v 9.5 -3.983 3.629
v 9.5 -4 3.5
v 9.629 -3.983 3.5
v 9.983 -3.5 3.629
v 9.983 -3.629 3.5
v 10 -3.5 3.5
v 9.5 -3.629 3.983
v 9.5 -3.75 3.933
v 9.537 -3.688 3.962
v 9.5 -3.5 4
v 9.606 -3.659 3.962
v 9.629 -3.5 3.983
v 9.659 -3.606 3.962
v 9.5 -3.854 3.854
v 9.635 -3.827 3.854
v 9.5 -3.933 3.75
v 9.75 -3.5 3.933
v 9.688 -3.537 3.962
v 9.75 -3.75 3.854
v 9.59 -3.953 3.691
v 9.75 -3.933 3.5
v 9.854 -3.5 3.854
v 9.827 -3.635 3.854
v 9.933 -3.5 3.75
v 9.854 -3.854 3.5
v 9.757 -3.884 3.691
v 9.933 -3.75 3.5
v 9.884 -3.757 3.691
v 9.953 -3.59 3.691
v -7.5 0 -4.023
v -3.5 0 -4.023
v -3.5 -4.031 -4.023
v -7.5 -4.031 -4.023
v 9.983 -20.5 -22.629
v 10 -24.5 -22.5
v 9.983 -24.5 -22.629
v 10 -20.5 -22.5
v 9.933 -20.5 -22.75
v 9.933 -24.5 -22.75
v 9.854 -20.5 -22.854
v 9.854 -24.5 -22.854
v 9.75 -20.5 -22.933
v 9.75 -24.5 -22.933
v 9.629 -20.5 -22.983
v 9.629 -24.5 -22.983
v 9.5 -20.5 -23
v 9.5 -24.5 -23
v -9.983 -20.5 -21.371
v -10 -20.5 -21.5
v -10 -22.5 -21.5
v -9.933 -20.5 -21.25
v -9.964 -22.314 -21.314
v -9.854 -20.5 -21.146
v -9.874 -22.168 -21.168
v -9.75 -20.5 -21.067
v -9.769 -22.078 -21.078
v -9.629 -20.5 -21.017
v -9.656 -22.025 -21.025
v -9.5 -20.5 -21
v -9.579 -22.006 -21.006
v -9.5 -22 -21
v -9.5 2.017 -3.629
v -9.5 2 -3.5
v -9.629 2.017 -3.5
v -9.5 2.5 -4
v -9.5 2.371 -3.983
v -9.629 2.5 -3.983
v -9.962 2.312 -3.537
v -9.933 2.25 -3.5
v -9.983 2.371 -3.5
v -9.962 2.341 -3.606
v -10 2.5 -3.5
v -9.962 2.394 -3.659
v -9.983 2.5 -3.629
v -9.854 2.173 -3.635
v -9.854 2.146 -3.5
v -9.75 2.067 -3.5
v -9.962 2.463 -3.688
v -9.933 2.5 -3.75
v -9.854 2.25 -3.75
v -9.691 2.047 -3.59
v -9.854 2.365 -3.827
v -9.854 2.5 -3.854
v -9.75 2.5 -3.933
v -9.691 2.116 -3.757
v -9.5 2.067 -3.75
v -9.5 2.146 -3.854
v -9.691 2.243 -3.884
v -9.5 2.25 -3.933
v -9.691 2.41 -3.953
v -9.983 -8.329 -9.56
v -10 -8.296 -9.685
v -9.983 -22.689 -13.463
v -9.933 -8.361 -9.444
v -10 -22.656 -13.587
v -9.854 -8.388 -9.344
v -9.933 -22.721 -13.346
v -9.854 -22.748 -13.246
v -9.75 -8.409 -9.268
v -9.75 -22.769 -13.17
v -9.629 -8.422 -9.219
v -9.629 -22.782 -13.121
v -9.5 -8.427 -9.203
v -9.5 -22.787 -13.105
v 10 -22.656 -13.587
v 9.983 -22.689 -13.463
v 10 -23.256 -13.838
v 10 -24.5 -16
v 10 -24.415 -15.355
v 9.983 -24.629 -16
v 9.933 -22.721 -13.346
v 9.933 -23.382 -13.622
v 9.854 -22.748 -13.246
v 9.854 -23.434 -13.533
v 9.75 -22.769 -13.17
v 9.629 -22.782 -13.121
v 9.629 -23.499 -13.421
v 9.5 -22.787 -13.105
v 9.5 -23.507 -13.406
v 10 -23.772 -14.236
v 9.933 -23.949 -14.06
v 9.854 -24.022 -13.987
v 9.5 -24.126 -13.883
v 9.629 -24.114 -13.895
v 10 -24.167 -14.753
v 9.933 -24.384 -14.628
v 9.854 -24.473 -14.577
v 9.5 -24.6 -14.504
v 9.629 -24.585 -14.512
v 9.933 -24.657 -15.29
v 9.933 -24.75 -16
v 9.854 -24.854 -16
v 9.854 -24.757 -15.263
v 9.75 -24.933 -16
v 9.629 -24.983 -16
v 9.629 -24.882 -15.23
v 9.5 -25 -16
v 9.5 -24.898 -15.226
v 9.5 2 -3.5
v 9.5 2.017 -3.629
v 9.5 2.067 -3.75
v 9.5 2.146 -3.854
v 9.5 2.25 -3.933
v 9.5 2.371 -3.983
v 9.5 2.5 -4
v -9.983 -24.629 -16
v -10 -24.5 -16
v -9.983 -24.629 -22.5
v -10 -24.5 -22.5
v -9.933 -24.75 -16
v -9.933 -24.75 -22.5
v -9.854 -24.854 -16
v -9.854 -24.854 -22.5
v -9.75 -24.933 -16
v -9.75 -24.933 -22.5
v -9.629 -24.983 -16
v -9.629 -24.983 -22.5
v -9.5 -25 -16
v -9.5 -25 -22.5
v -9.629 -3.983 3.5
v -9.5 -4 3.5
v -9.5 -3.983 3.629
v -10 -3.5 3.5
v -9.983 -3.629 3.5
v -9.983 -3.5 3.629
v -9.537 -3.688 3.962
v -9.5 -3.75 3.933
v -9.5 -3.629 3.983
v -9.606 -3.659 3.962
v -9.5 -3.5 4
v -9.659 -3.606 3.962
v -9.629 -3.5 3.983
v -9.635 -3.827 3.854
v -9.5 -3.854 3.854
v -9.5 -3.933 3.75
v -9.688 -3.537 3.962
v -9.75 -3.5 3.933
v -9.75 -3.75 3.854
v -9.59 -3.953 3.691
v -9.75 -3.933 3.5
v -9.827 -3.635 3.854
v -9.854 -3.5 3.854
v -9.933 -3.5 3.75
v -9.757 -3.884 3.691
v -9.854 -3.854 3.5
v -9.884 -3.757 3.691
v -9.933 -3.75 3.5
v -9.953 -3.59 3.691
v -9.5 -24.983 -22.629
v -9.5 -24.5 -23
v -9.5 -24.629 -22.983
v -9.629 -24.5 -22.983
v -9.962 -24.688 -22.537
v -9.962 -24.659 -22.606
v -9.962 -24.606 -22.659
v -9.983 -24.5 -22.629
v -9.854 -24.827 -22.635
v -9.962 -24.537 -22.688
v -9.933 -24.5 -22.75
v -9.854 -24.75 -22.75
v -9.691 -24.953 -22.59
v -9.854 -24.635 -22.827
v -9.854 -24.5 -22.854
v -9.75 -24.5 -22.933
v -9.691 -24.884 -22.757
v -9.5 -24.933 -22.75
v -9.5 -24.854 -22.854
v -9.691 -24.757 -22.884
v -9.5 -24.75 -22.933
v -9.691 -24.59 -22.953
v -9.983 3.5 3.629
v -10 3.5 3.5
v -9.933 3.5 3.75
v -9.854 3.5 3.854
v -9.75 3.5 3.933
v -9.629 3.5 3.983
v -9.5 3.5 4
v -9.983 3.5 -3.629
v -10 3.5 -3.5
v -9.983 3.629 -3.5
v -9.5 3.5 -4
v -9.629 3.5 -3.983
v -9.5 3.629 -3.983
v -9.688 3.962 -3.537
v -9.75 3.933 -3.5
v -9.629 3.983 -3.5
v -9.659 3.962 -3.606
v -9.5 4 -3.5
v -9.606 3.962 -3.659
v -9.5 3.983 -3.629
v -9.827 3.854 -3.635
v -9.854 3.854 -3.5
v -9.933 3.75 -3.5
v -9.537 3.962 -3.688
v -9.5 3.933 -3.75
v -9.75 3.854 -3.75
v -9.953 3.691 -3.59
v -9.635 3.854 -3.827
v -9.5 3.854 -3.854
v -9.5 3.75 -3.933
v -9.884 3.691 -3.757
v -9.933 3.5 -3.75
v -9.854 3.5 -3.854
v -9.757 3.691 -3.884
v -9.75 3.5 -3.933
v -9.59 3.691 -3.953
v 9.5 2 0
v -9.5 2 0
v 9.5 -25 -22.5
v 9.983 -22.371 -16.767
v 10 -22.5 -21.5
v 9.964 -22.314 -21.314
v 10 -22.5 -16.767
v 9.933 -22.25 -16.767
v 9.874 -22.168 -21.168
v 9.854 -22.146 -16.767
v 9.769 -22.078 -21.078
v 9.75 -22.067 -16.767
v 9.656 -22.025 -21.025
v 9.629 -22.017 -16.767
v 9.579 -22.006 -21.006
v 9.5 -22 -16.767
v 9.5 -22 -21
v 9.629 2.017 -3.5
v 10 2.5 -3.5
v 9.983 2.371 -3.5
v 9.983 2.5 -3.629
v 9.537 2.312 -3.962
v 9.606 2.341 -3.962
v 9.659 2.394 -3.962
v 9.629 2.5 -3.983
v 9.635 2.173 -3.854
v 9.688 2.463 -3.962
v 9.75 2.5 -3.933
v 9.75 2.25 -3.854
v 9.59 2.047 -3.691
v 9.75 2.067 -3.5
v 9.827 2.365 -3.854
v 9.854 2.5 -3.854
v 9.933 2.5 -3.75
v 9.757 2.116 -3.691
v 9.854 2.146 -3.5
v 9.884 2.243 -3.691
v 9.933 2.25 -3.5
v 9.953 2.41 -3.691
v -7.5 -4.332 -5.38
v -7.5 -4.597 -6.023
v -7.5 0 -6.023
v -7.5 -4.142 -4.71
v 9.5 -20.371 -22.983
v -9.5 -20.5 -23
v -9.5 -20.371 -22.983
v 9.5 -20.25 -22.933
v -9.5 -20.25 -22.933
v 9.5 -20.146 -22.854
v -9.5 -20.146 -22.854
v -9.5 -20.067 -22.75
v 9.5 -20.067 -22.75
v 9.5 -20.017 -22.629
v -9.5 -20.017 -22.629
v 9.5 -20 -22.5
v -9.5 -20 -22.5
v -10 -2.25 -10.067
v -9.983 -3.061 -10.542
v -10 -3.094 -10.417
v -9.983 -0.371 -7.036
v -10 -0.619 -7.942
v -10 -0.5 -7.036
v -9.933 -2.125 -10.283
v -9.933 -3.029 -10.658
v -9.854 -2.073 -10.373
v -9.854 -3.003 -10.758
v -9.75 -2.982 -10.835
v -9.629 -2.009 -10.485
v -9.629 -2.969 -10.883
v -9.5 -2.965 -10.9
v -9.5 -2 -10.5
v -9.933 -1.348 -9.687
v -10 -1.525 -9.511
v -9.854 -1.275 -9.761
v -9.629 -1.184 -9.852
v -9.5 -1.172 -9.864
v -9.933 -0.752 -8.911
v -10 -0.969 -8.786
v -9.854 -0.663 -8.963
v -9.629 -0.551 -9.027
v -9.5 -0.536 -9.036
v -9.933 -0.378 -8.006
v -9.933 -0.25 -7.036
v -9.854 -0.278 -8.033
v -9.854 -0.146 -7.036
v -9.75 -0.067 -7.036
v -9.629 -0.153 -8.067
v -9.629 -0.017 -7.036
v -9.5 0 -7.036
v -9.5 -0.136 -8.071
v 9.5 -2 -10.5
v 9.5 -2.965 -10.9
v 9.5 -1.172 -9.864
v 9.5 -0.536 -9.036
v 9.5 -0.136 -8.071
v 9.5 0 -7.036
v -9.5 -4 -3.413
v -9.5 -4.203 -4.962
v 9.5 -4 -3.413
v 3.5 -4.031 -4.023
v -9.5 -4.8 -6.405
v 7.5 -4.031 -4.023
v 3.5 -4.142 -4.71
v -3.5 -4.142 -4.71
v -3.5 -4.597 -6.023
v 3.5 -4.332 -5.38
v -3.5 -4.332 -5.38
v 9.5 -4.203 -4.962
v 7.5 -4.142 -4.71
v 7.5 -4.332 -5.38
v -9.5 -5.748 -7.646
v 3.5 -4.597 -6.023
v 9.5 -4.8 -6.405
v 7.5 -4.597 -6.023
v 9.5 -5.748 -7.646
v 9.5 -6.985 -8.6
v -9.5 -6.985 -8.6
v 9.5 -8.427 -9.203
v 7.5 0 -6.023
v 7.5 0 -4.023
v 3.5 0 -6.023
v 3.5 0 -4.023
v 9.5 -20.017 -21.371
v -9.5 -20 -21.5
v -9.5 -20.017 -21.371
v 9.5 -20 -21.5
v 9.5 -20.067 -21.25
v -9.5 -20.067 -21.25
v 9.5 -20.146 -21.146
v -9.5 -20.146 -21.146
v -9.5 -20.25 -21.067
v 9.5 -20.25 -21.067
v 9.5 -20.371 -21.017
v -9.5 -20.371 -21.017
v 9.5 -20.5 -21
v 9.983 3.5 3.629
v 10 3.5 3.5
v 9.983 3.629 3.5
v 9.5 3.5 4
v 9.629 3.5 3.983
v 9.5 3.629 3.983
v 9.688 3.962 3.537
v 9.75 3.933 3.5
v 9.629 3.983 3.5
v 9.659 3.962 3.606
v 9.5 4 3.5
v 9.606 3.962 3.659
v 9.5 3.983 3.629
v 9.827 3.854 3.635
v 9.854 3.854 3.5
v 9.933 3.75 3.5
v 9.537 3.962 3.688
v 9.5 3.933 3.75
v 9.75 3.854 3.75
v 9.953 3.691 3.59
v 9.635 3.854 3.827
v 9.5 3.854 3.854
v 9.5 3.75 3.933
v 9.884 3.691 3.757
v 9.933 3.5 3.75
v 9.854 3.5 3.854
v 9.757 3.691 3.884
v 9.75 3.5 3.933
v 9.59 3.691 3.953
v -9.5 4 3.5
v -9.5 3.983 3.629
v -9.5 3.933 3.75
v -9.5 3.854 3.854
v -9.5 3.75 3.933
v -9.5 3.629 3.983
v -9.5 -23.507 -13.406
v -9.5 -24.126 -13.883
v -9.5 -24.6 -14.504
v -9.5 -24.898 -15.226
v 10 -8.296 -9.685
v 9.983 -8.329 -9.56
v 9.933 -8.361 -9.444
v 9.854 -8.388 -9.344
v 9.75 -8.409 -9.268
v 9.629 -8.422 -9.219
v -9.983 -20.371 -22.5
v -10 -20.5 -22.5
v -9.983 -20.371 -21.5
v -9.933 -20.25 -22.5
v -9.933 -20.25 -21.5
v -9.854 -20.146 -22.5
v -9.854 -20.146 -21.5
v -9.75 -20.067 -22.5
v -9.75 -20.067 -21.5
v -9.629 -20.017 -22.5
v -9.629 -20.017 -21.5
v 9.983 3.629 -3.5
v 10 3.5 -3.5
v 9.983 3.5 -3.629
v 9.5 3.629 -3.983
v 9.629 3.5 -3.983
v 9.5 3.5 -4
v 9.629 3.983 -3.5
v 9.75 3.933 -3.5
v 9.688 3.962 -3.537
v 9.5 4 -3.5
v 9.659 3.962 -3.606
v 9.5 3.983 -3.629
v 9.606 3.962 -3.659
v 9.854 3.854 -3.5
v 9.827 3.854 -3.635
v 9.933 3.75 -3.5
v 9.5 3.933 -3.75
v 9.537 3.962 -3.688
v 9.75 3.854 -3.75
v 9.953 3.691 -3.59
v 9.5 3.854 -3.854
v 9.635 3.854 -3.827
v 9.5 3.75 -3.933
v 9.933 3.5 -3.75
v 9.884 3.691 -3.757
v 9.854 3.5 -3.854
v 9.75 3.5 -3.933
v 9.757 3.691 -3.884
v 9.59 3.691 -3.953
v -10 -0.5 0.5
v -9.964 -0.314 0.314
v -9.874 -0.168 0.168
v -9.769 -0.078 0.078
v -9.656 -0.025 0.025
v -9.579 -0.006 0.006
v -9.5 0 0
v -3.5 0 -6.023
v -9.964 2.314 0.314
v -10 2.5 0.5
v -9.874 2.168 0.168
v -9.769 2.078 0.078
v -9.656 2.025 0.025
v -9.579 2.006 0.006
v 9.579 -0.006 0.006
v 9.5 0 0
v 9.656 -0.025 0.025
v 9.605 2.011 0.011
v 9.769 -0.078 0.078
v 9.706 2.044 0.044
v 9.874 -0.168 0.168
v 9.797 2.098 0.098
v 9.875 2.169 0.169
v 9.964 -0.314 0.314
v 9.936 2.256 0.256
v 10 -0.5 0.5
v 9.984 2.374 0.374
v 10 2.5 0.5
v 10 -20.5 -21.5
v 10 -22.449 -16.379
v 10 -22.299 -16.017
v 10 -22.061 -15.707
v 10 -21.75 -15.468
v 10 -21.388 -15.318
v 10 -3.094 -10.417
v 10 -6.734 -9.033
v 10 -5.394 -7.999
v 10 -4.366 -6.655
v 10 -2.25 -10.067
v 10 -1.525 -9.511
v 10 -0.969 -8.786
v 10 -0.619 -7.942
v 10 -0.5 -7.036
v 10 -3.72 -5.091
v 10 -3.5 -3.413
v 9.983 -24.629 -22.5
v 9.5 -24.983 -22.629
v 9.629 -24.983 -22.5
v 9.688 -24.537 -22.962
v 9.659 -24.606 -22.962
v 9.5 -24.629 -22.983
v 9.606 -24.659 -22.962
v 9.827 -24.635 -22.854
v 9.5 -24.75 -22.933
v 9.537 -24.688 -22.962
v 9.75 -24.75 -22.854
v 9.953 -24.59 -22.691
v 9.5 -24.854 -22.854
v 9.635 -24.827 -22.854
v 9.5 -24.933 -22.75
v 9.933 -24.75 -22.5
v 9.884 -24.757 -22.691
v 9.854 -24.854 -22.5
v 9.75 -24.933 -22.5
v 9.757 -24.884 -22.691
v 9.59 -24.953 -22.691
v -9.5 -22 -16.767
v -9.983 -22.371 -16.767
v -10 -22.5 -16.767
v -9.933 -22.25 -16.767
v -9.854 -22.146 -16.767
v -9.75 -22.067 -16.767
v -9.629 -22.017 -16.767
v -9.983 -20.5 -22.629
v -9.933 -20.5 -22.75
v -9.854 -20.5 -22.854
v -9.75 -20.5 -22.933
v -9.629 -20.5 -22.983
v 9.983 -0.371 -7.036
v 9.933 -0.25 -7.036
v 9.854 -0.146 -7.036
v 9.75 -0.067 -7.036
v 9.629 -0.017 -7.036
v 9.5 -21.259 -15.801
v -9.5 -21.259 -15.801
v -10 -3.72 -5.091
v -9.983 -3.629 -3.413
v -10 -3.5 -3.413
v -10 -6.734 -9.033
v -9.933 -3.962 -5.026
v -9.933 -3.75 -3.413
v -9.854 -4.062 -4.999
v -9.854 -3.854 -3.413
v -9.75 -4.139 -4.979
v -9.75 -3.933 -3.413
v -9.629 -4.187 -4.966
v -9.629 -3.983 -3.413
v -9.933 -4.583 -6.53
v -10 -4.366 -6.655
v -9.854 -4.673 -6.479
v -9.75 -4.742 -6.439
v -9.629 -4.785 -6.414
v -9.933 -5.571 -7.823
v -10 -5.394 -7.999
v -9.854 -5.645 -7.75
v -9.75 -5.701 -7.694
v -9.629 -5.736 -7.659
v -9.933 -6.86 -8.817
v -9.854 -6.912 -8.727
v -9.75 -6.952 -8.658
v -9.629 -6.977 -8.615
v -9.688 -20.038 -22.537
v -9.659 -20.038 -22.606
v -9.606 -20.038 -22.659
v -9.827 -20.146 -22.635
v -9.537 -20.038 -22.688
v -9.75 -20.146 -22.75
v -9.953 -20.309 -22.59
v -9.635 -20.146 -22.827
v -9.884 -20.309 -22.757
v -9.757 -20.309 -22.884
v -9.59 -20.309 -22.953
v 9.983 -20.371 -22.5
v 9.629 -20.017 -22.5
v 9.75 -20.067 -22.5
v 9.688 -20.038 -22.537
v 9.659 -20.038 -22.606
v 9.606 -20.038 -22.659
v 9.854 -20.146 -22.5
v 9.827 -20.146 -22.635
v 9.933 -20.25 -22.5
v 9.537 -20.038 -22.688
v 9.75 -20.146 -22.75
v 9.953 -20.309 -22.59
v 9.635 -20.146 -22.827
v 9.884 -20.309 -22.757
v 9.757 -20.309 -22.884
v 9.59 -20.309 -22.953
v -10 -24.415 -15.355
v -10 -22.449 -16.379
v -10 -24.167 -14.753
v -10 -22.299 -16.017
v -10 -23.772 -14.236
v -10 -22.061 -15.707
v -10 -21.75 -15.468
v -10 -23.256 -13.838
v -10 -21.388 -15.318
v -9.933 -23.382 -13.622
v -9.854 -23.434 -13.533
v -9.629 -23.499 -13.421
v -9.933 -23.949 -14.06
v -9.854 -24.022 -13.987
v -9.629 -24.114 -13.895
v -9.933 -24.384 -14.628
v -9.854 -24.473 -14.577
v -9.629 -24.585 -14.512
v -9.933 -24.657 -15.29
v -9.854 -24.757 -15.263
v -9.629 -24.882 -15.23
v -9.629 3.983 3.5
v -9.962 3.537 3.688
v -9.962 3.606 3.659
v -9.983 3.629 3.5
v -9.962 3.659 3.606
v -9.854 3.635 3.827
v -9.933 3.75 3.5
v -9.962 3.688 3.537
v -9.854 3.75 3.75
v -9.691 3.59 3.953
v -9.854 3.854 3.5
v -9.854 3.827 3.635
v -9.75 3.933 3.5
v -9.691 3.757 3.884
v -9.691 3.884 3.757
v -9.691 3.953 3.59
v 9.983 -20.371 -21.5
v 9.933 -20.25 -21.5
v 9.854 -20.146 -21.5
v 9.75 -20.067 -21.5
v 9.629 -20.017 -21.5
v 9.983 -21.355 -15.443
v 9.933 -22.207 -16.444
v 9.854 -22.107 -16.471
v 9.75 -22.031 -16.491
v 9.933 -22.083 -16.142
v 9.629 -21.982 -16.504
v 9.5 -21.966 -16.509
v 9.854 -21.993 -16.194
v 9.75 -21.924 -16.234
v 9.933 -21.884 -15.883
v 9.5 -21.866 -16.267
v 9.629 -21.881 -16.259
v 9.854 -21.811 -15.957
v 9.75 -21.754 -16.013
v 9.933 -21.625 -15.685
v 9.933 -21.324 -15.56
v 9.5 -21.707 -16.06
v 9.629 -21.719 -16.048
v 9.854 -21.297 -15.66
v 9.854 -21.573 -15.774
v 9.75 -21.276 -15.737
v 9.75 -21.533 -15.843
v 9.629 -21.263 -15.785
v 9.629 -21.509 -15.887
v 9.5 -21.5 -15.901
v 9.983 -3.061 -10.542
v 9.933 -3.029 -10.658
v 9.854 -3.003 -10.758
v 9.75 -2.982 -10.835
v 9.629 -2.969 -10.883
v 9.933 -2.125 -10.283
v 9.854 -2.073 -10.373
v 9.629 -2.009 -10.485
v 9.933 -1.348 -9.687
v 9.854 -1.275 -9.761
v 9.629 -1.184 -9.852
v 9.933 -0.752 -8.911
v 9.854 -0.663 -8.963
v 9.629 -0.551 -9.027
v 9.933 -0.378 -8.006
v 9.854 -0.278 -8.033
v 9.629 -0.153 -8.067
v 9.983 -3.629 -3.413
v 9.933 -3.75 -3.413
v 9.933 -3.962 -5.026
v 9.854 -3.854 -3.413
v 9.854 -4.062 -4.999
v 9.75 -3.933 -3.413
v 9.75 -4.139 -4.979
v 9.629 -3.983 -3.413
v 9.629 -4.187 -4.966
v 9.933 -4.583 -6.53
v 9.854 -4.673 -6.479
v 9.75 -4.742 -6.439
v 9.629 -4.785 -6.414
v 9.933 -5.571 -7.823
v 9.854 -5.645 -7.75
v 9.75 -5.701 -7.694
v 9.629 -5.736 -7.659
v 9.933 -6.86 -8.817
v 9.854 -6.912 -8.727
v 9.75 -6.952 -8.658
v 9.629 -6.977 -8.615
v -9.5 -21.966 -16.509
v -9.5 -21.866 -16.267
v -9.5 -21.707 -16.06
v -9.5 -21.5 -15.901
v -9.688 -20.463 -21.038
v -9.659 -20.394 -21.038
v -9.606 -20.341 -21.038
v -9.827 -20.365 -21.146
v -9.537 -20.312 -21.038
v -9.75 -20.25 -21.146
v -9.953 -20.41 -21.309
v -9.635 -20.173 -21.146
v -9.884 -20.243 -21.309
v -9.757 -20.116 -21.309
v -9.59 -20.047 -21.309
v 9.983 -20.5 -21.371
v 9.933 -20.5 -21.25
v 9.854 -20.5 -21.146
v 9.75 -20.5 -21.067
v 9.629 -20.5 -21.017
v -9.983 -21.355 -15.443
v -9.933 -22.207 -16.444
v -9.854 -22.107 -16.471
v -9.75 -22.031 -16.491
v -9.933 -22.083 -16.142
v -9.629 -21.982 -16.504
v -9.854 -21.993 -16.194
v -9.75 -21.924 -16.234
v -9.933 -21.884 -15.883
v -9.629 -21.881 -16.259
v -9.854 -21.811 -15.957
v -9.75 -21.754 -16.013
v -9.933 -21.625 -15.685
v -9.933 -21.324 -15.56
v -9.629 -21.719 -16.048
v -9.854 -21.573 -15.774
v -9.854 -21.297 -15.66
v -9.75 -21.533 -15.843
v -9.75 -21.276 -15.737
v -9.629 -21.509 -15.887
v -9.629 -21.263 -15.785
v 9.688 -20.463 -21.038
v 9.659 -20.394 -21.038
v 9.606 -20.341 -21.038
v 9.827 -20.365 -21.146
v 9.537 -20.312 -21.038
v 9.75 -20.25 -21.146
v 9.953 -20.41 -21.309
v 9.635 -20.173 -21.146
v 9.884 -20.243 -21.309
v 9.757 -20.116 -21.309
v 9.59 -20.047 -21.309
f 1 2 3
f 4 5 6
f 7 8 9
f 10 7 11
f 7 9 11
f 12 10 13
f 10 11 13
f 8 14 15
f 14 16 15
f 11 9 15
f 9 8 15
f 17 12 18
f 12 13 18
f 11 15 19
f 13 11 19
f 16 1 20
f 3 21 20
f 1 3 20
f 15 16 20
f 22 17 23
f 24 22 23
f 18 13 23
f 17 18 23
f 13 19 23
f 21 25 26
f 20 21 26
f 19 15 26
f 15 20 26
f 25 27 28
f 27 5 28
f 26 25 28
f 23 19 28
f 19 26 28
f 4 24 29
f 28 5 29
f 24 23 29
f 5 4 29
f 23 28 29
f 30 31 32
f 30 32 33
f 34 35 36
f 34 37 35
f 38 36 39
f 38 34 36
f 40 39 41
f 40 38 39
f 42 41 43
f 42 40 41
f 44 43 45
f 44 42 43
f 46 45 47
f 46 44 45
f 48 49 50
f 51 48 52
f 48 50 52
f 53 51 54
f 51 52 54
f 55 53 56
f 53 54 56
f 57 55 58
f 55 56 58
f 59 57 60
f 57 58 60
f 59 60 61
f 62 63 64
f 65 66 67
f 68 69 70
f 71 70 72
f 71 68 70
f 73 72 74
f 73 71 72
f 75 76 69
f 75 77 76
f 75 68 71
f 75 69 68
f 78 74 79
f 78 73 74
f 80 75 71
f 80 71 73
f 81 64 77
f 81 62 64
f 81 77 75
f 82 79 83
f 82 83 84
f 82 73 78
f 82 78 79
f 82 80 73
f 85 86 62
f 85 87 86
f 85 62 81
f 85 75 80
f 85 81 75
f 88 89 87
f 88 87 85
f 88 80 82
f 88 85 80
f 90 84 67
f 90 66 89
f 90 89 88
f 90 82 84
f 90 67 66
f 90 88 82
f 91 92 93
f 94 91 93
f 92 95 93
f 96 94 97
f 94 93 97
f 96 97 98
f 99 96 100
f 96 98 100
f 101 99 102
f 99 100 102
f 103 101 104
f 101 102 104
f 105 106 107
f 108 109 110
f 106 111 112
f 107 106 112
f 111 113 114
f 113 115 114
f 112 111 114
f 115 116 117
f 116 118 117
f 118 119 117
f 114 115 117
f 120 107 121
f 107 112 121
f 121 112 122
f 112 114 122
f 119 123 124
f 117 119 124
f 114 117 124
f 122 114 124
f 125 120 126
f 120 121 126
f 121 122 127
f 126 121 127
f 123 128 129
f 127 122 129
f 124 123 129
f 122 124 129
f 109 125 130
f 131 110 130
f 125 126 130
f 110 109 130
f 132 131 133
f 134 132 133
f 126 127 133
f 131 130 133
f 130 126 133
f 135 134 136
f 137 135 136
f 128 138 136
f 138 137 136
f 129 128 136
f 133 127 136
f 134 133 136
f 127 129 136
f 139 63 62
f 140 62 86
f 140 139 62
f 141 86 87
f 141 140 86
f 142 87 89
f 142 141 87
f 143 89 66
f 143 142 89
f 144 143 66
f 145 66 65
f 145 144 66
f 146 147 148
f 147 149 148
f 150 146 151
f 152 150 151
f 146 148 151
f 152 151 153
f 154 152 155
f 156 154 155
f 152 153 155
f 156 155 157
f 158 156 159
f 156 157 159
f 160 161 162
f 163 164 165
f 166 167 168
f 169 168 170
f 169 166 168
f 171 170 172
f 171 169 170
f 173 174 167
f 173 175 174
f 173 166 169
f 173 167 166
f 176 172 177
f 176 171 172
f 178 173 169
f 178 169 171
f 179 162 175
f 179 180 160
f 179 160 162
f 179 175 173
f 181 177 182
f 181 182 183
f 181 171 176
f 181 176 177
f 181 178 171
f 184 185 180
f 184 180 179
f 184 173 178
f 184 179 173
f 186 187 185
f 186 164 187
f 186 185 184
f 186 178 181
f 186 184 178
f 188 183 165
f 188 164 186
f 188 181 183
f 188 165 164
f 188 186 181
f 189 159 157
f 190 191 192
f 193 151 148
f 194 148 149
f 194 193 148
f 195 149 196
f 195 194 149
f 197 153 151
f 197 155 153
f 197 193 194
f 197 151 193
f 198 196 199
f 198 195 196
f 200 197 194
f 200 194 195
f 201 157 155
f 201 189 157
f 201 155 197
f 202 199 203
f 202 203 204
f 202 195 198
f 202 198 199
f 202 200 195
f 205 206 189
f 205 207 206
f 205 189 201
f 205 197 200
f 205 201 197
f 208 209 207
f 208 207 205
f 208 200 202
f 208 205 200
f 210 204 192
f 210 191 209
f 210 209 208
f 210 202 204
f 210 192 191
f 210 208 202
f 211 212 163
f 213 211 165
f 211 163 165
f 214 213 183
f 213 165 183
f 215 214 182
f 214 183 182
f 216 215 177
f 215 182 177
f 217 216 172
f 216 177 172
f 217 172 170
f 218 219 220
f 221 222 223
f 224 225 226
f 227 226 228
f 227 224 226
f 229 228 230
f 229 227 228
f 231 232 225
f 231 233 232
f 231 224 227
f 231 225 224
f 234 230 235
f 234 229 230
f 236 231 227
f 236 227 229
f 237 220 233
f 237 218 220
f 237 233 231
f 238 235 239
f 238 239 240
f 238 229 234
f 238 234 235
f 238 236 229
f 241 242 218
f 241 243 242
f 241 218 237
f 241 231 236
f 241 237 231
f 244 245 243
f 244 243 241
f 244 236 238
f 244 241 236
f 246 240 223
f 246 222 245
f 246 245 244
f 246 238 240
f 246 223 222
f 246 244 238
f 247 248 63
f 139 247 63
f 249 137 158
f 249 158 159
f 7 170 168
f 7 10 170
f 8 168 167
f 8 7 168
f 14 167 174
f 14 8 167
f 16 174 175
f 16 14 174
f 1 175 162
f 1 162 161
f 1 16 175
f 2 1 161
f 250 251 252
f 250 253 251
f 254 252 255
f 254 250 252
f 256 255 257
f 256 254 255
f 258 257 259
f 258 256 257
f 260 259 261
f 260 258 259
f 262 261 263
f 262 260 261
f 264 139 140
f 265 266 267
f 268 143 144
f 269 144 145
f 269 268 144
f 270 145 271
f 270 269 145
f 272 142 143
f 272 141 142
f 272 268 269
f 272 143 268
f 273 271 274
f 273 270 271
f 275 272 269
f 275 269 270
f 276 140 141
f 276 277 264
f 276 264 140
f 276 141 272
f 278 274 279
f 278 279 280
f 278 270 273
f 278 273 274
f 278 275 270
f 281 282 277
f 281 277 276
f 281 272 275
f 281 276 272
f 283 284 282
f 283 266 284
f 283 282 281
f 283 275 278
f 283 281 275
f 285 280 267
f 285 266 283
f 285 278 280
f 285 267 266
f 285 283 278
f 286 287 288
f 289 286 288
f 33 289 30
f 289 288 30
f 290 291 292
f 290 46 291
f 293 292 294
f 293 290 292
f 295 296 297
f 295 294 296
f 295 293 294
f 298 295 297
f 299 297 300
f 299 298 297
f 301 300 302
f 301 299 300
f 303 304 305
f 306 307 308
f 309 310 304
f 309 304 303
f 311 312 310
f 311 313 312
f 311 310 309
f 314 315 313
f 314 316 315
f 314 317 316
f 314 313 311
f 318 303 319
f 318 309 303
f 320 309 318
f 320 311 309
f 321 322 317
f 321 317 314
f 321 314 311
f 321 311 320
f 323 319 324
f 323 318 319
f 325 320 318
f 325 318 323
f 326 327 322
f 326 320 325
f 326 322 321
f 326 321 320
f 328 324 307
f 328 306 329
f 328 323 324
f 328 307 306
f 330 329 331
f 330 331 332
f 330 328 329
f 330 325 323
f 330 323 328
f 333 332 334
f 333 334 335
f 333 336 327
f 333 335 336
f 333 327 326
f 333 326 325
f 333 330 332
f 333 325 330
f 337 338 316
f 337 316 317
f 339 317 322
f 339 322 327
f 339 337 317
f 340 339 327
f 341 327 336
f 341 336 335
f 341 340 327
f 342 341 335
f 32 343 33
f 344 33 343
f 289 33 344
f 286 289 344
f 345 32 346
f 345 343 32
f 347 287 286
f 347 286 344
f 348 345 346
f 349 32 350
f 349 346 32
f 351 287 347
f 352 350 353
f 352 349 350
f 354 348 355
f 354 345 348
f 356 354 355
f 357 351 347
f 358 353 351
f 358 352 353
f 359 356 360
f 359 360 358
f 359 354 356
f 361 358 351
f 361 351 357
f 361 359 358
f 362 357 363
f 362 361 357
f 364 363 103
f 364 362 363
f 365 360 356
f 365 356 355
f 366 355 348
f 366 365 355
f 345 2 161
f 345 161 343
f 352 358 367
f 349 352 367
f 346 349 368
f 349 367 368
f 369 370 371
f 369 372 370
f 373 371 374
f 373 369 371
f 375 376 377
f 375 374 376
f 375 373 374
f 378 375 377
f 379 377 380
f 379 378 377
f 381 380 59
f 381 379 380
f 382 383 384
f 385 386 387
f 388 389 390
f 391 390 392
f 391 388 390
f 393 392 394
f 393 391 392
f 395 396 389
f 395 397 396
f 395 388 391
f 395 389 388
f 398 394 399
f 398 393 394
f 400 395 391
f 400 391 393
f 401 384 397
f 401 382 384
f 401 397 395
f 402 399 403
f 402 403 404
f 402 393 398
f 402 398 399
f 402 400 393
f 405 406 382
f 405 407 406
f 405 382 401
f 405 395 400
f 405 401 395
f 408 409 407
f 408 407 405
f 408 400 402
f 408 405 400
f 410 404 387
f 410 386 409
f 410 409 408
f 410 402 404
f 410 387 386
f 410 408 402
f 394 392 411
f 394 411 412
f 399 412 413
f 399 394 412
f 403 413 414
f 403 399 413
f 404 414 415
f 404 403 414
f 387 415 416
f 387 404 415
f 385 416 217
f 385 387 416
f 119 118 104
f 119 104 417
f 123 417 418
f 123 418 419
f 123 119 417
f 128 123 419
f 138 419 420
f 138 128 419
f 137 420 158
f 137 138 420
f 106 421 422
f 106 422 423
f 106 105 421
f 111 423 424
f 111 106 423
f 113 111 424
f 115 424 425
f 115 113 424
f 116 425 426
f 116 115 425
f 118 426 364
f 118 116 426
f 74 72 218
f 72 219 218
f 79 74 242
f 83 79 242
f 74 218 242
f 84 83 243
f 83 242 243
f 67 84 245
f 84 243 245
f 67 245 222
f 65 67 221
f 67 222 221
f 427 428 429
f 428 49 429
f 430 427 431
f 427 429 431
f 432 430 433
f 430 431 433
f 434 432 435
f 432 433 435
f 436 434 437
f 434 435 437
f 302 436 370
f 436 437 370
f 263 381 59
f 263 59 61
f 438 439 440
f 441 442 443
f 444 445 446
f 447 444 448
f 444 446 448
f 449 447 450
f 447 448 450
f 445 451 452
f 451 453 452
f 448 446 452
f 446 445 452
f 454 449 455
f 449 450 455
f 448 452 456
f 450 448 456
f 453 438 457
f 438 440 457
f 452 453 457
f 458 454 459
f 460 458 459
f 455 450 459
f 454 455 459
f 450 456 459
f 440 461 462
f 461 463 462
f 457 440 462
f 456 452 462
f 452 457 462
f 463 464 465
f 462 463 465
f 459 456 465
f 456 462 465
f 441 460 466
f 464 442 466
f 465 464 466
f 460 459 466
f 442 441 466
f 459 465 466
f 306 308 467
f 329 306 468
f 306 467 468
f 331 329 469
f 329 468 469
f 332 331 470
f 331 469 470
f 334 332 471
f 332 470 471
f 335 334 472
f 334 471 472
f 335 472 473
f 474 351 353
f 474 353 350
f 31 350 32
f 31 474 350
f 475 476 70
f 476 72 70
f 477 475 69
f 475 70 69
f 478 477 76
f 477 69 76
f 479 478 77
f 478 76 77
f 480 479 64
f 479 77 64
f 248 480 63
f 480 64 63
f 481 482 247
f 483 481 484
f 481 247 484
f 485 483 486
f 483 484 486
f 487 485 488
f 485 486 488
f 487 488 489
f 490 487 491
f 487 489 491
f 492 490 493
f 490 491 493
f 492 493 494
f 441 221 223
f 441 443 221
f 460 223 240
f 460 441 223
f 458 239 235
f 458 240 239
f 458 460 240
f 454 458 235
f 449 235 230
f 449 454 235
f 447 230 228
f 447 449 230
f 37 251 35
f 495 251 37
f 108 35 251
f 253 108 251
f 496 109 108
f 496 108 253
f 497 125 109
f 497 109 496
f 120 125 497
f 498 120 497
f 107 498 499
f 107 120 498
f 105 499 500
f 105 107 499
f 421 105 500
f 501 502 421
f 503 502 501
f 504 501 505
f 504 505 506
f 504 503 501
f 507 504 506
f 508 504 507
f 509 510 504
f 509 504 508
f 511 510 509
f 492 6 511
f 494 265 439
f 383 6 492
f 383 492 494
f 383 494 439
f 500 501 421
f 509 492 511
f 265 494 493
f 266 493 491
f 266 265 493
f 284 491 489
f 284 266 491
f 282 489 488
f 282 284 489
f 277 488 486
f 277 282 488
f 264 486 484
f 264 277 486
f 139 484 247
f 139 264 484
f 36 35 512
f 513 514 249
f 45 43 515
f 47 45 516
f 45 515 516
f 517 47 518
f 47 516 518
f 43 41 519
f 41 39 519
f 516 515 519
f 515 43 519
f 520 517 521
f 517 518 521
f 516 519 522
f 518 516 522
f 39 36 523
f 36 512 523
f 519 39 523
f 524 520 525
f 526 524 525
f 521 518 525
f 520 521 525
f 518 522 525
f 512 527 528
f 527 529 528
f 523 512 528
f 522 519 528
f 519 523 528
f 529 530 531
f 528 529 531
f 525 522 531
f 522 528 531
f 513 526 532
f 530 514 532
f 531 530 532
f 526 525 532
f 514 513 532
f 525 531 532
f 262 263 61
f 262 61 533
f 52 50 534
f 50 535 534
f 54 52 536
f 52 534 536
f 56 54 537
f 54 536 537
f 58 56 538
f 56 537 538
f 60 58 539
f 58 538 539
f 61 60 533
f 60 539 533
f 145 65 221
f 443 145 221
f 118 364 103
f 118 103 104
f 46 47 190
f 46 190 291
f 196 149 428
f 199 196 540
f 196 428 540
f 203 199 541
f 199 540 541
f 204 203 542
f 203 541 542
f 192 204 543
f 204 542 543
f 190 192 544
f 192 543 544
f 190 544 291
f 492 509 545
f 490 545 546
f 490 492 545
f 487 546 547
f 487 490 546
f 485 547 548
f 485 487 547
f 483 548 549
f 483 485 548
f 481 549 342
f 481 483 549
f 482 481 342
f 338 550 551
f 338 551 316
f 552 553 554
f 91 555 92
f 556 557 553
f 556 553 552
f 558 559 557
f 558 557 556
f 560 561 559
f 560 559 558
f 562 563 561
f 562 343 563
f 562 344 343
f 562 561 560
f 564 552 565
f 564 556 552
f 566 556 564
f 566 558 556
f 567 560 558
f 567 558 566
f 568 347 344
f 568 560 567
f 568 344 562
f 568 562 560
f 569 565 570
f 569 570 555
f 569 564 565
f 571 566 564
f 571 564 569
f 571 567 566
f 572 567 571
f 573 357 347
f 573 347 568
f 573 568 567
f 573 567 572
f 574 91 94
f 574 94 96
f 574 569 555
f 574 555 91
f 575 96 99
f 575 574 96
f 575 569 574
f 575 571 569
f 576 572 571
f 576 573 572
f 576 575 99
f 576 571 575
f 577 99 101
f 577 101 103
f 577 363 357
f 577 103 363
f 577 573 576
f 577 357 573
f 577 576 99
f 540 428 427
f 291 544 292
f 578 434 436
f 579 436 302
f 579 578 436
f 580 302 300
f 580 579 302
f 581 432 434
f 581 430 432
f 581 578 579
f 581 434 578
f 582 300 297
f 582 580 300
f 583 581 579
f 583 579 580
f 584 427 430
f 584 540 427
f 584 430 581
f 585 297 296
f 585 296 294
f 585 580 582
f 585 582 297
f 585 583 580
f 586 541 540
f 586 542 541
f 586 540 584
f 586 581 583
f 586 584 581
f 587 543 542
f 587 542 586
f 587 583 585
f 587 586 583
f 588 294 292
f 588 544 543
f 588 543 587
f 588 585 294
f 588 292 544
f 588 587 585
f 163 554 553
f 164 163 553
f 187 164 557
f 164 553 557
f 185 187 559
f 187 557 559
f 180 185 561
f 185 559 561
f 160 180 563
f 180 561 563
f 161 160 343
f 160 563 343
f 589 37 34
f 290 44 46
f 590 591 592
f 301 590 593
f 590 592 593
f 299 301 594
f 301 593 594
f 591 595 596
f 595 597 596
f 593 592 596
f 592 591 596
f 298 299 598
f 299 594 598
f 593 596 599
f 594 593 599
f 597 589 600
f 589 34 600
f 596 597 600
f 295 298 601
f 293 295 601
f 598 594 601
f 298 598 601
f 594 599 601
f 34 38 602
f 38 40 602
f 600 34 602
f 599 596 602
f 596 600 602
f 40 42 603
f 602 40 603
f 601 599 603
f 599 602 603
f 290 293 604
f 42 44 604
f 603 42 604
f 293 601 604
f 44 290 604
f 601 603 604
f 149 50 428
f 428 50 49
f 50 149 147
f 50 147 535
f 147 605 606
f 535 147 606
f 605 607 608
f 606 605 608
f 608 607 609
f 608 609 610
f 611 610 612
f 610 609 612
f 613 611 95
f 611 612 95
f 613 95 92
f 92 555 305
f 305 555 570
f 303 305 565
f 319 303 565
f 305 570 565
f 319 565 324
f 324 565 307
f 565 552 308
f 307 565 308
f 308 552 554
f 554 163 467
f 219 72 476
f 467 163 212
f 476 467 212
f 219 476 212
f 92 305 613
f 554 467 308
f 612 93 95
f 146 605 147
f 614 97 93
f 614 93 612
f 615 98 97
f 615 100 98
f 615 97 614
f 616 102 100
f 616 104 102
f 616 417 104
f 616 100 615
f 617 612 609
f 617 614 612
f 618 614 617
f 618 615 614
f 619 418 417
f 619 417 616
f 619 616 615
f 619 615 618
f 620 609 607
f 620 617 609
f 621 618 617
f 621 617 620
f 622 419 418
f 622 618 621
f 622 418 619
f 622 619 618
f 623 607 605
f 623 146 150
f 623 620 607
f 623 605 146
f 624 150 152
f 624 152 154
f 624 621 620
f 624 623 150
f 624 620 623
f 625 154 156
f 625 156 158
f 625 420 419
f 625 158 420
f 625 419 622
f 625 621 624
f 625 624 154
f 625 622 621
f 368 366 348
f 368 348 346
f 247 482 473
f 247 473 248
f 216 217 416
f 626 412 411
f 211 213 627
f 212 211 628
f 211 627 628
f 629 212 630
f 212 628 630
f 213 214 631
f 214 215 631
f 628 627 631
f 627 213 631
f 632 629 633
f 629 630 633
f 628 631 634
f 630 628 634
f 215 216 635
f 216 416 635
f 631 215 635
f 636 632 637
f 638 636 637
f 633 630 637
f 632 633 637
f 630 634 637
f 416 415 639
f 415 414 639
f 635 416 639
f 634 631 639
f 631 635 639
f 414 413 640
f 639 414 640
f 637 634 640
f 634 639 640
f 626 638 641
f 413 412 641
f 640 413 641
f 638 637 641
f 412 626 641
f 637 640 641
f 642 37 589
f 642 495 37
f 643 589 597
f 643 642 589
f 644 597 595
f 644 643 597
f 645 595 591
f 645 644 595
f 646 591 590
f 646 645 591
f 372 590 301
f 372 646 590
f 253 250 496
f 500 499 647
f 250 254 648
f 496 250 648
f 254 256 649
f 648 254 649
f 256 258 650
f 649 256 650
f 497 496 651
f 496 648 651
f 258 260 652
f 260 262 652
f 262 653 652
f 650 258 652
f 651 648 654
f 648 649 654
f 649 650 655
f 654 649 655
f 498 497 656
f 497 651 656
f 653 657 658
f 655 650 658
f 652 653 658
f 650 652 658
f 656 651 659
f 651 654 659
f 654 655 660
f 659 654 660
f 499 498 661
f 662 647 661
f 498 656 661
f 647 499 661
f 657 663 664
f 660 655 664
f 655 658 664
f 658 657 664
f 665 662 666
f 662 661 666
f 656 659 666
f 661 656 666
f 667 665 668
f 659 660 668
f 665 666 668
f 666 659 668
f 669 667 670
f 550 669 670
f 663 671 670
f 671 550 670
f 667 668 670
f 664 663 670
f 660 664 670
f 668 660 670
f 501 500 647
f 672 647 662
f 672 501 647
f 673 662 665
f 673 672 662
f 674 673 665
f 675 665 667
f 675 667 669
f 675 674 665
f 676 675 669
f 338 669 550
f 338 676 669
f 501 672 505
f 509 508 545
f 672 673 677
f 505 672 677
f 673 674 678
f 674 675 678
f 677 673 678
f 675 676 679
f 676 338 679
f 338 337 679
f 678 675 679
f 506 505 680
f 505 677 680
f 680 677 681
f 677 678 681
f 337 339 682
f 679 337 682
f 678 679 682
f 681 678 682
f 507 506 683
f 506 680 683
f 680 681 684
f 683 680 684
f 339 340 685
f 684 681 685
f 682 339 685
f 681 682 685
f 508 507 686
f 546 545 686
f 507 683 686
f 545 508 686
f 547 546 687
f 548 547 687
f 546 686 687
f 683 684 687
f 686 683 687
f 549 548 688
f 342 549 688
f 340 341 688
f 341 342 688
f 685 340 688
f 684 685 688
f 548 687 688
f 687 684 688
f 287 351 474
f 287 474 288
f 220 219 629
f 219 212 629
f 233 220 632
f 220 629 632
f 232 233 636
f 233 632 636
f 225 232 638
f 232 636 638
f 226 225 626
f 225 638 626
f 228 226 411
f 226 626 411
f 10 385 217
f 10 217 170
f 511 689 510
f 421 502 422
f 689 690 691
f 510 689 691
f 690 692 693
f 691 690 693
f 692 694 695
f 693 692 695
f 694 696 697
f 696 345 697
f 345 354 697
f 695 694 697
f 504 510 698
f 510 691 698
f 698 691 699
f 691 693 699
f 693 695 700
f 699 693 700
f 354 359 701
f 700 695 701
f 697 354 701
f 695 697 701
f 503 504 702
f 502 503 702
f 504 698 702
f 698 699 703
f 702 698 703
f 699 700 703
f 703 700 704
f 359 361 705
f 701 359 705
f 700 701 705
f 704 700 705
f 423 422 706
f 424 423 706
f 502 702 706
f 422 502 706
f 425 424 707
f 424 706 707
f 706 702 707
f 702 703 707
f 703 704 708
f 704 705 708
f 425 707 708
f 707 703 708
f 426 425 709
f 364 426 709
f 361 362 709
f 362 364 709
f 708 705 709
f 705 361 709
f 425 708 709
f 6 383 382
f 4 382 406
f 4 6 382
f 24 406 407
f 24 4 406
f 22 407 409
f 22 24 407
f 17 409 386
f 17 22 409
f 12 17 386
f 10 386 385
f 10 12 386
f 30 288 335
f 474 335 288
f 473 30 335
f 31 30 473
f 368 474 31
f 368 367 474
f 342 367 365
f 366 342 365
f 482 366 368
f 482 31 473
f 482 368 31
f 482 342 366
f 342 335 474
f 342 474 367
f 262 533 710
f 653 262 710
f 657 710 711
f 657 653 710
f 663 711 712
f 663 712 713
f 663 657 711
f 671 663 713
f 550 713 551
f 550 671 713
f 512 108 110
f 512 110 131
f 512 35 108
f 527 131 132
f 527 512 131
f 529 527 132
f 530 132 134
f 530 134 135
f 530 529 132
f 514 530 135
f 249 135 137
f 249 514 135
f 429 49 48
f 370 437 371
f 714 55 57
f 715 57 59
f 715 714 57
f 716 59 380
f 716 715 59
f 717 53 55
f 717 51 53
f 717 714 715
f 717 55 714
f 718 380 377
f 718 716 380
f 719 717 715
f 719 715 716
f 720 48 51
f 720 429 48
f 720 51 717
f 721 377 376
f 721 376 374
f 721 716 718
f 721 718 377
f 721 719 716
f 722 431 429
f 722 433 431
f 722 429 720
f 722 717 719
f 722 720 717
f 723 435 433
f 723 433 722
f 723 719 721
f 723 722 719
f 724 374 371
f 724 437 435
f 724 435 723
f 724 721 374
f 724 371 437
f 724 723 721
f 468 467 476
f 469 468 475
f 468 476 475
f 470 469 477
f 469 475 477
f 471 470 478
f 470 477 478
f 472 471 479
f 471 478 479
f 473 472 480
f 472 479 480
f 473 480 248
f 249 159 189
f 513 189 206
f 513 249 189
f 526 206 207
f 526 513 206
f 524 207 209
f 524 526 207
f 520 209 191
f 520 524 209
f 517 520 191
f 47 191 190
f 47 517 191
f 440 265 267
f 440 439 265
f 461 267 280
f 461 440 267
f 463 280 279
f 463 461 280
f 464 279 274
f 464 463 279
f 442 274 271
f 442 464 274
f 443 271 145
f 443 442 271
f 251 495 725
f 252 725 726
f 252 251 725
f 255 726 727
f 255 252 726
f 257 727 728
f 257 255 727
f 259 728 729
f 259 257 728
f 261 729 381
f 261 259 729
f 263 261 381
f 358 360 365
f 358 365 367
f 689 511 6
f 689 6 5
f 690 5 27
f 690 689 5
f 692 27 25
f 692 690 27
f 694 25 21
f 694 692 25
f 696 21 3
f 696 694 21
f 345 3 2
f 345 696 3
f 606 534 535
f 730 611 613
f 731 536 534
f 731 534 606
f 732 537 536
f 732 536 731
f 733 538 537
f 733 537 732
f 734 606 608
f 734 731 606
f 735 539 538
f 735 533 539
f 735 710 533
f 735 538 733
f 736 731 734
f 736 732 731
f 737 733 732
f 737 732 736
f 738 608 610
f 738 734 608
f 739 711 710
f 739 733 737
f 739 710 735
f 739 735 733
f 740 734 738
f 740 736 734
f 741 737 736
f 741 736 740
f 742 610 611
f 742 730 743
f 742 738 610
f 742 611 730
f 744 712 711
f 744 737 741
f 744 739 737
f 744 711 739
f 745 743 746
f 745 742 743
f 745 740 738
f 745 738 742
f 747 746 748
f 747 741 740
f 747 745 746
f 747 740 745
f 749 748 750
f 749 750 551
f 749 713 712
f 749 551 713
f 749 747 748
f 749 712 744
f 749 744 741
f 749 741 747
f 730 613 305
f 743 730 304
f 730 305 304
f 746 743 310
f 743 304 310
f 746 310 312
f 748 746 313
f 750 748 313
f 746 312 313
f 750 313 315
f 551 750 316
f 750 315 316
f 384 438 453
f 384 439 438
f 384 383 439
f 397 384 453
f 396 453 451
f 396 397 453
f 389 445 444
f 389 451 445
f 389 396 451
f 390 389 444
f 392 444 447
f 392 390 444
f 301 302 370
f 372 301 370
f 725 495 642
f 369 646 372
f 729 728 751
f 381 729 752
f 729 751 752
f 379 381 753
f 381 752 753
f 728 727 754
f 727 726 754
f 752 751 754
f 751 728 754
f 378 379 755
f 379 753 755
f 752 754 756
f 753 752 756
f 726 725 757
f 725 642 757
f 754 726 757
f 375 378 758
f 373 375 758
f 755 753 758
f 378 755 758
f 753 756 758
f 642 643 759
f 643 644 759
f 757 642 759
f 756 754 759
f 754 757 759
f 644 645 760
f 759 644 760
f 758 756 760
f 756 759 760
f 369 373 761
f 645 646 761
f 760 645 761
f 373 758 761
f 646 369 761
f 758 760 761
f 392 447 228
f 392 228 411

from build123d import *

# Parameters (mm, degrees)
F1_DEPTH = 10
F2_W     = 4
F2_H     = 2
F3_DEPTH = 4.5984521023
F4_R     = 0.5


with BuildPart() as f1:
    # F0 (on Right) → F1 (new body, symmetric)
    with BuildSketch(Plane.YZ):
        with BuildLine():
            Line((0, -7.0358098146), (0, 0))
            Line((0, 0), (2, 0))
            Line((2, 0), (2, -4))
            Line((2, -4), (4, -4))
            Line((4, -4), (4, 0))
            Line((4, 0), (4, 4))
            Line((4, 4), (-4, 4))
            Line((-4, 4), (-4, 0))
            Line((-4, 0), (-4, -3.4128310664))
            ThreePointArc((-4, -3.4128310664), (-5.2334442571, -7.0569971371), (-8.4266487834, -9.2028713037))
            Line((-8.4266487834, -9.2028713037), (-22.7866756083, -13.1049798814))
            ThreePointArc((-22.7866756083, -13.1049798814), (-24.3832778714, -14.1779169647), (-25, -16))
            Line((-25, -16), (-25, -21))
            Line((-25, -21), (-25, -23))
            Line((-25, -23), (-20, -23))
            Line((-20, -23), (-20, -21))
            Line((-20, -21), (-22, -21))
            Line((-22, -21), (-22, -16.767326988))
            ThreePointArc((-22, -16.767326988), (-21.7933533403, -16.158565559), (-21.2588190451, -15.8014011617))
            Line((-21.2588190451, -15.8014011617), (-2.9647238196, -10.8995131198))
            ThreePointArc((-2.9647238196, -10.8995131198), (-0.8265866388, -9.4708555306), (0, -7.0358098146))
        make_face()
    extrude(amount=F1_DEPTH, both=True)

    # F2 (on face) → F3 (cut, through all)
    with BuildSketch(Plane(origin=(0, 0, 0), x_dir=(-1, 0, 0), z_dir=(0, 1, 0))):
        with Locations((-5.5, -5.0229031369)):
            Rectangle(F2_W, F2_H)
        with Locations((5.5, -5.0229031369)):
            Rectangle(F2_W, F2_H)
    extrude(amount=-F3_DEPTH, mode=Mode.SUBTRACT)

    # F4
    f4_edges = [f1.edges().sort_by_distance(p)[0] for p in [
        (10, -5.233444, -7.056997),
        (10, -15.606662, -11.153926),
        (10, -22.5, -23),
        (10, -20, -22),
        (10, -21, -21),
        (10, -22, -18.883663),
        (0, -25, -23),
        (-10, -25, -19.5),
        (0, -4, 4),
        (10, 0, 4),
        (10, 1, 0),
        (10, 2, -2),
        (0, 2, -4),
        (10, 3, -4),
        (10, 4, 0),
        (0, 4, 4),
        (-10, 0, 4),
        (-10, -0.826587, -9.470856),
        (-10, 0, -3.517905),
        (-10, 1, 0),
        (-10, 2, -2),
        (-10, 3, -4),
        (-10, 4, 0),
        (-10, -4, 0.293584),
        (-10, -5.233444, -7.056997),
        (-10, -15.606662, -11.153926),
        (-10, -24.383278, -14.177917),
        (-10, -22.5, -23),
        (-10, -20, -22),
        (-10, -21, -21),
        (-10, -22, -18.883663),
        (-10, -21.793353, -16.158566),
        (-10, -12.111771, -13.350457),
        (10, -24.383278, -14.177917),
        (10, -21.793353, -16.158566),
        (0, -20, -21),
        (0, -20, -23),
        (0, 4, -4),
    ]]
    fillet(f4_edges, radius=F4_R)


solid = f1.part
